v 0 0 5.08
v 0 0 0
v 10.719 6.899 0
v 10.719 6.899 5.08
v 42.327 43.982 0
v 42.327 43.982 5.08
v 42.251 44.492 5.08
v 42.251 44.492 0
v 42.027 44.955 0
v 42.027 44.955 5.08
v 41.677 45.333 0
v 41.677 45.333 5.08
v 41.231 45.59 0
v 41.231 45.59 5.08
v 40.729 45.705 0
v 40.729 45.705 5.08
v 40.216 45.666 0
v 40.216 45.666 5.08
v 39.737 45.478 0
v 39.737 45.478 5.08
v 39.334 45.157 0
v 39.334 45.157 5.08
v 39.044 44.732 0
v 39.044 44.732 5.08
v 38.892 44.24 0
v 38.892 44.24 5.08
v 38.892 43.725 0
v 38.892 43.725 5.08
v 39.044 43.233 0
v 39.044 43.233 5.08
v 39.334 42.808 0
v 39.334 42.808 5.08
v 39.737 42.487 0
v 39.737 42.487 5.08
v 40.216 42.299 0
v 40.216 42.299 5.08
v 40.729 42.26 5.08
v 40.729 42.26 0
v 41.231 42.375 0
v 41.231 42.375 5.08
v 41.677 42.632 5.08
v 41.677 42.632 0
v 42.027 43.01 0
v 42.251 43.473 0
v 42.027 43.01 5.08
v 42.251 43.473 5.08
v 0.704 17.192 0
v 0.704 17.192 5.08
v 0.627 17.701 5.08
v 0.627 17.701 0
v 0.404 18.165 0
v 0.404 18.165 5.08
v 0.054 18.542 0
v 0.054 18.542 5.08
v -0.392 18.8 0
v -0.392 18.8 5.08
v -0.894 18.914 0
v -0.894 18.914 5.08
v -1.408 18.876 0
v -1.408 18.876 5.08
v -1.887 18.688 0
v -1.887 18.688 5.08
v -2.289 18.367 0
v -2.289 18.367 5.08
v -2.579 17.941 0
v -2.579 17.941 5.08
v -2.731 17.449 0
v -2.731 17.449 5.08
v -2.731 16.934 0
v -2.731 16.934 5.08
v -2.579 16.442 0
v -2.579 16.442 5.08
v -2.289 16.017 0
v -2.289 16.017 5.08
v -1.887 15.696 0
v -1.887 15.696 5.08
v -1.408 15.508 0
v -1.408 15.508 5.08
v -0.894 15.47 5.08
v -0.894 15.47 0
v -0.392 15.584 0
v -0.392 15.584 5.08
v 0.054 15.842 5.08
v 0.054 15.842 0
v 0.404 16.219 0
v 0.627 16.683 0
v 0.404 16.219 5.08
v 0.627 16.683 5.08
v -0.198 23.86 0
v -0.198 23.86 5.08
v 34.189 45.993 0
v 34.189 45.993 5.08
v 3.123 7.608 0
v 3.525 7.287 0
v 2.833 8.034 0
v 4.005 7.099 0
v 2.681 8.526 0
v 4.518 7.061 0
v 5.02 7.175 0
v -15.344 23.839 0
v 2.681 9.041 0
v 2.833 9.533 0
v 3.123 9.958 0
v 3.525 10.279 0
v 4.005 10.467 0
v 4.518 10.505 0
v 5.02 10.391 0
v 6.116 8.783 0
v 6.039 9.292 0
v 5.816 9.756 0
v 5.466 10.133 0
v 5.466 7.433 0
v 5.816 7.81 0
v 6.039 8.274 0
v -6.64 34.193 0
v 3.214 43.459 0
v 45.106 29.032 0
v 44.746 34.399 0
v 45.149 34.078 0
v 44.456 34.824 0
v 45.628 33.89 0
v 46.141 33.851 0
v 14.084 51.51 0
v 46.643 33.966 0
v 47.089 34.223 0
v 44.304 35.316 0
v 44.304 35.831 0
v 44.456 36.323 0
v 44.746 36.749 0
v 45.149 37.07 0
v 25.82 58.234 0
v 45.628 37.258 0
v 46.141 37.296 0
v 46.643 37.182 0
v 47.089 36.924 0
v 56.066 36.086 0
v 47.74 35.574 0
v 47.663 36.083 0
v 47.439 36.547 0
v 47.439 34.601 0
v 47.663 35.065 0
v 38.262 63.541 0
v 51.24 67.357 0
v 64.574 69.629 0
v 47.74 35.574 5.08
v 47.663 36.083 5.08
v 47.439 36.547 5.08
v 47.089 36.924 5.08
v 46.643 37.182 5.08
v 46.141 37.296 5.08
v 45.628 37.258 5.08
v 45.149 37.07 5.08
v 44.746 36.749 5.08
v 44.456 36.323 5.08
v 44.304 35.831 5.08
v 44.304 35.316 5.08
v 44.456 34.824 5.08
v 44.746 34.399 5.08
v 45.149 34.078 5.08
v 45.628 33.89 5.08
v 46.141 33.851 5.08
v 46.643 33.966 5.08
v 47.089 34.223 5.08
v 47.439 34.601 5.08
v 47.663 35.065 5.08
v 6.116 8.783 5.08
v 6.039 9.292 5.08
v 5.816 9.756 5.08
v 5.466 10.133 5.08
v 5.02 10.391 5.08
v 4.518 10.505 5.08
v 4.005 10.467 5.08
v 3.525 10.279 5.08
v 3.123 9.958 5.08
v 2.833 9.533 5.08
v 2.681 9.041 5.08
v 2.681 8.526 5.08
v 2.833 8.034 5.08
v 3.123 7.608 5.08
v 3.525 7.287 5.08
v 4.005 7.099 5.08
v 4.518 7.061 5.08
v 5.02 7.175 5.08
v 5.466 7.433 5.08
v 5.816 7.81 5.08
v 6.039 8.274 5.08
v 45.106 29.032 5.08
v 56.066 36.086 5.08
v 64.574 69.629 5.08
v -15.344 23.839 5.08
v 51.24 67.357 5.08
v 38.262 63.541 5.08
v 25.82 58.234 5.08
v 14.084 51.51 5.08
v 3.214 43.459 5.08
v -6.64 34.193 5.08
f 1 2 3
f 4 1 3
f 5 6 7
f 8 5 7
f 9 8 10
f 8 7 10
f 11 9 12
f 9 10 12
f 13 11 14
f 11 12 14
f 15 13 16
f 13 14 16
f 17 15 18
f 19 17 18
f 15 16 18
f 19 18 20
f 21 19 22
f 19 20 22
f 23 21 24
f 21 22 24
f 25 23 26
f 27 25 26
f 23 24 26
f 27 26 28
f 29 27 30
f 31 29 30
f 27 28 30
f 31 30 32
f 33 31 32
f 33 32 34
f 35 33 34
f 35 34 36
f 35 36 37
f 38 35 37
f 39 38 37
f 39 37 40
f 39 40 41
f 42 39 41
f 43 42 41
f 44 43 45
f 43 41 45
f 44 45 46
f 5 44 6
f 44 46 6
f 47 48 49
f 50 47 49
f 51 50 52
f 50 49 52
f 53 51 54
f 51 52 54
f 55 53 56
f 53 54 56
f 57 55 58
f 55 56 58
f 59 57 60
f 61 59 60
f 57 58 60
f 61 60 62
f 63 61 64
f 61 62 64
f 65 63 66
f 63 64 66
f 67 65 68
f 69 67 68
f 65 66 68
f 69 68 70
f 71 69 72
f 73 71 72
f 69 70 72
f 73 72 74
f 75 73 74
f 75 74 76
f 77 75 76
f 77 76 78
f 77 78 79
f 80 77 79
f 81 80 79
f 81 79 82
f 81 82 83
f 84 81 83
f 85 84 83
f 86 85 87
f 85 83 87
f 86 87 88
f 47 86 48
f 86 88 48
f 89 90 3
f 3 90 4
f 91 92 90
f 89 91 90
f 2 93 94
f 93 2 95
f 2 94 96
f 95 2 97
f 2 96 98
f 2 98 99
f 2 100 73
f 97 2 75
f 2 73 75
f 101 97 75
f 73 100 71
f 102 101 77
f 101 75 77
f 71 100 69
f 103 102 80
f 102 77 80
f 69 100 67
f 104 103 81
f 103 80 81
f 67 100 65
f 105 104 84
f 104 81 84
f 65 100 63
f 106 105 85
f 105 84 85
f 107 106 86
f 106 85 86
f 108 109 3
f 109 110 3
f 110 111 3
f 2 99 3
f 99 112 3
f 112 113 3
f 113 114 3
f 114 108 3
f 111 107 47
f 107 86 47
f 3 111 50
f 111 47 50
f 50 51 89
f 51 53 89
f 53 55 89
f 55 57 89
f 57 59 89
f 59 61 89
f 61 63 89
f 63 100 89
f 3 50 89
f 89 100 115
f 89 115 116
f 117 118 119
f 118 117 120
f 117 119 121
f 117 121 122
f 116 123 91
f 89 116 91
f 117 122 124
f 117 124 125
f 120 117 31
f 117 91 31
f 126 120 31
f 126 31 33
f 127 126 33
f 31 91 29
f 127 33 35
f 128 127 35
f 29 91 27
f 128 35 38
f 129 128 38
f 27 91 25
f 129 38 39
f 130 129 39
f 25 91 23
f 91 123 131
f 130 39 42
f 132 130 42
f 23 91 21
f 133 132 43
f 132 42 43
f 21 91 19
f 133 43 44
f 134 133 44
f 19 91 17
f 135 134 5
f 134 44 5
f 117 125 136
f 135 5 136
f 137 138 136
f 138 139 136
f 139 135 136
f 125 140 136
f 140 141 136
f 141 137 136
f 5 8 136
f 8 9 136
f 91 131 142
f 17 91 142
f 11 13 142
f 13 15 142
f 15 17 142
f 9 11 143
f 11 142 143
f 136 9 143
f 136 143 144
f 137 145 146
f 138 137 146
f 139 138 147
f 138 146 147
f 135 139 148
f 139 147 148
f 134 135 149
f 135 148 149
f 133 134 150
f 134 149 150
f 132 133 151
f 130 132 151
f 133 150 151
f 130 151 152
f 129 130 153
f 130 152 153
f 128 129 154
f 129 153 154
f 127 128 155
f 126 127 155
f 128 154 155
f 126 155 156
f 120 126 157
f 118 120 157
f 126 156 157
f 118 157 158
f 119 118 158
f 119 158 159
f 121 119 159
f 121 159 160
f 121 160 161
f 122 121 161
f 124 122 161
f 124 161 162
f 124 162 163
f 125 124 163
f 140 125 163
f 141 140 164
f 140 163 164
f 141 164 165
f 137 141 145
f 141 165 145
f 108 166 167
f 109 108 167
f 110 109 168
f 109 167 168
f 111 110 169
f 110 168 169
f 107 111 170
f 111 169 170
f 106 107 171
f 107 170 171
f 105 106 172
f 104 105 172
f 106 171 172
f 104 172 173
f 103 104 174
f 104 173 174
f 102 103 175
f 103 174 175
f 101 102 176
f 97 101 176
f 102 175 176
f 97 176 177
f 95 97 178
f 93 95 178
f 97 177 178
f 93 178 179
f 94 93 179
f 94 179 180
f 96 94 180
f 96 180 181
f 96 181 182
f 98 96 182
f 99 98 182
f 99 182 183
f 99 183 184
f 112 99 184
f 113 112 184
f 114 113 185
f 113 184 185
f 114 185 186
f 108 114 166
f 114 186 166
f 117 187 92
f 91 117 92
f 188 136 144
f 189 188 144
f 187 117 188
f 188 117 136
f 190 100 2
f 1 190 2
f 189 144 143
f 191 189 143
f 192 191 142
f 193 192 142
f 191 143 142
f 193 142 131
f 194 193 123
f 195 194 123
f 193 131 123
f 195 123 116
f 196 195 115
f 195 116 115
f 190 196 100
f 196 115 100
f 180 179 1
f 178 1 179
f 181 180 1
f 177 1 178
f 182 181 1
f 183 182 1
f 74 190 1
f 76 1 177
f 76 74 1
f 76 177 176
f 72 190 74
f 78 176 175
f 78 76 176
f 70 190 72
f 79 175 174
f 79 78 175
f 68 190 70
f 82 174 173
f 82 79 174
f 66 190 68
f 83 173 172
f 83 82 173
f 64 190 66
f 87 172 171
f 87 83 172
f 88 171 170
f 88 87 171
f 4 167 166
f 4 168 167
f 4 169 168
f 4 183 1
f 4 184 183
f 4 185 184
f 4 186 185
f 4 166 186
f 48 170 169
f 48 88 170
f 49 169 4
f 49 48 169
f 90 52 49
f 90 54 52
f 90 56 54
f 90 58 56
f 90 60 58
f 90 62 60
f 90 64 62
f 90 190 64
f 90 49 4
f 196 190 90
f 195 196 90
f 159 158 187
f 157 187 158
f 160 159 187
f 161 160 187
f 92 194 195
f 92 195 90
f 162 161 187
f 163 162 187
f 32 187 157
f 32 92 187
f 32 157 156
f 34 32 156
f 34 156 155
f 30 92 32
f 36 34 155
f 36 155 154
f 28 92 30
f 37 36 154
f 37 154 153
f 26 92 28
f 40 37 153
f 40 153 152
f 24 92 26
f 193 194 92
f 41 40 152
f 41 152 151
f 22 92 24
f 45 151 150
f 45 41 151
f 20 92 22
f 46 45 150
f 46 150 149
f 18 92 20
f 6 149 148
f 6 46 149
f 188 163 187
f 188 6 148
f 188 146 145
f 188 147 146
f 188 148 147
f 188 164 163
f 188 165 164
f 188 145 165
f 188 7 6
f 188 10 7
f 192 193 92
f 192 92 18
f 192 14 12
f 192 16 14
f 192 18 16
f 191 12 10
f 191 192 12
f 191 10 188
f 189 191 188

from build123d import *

# Parameters (mm, degrees)
BOSS_EXTRUDE1_DEPTH = 5.08
SKETCH2_R           = 1.7272
CUT_EXTRUDE1_DEPTH  = 5.08


with BuildPart() as part:
    # Sketch1 → Boss-Extrude1 (new body)
    with BuildSketch(Plane.XY):
        with BuildLine():
            Line((-15.343524861, 23.838622958), (0, 0))
            Line((0, 0), (56.065565283, 36.086119416))
            Line((56.065565283, 36.086119416), (64.573765087, 69.628973221))
            ThreePointArc((64.573765087, 69.628973221), (19.853616616, 55.043986881), (-15.343524861, 23.838622958))
        make_face()
    extrude(amount=BOSS_EXTRUDE1_DEPTH)

    # Sketch2 → Cut-Extrude1 (cut)
    with BuildSketch(Plane.XY.offset(5.08)):
        with Locations((46.012387455, 35.57370741)):
            Circle(SKETCH2_R)
        with Locations((-1.023333215, 17.191896262)):
            Circle(SKETCH2_R)
        with Locations((4.388908167, 8.783112568)):
            Circle(SKETCH2_R)
        with Locations((40.600146073, 43.982491105)):
            Circle(SKETCH2_R)
        Polygon((10.799924344, 6.773067648), (45.186804384, 28.905887557), (34.189129896, 45.992536024), (-0.197750144, 23.859716115), align=None)
    extrude(amount=-CUT_EXTRUDE1_DEPTH, mode=Mode.SUBTRACT)


solid = part.part
